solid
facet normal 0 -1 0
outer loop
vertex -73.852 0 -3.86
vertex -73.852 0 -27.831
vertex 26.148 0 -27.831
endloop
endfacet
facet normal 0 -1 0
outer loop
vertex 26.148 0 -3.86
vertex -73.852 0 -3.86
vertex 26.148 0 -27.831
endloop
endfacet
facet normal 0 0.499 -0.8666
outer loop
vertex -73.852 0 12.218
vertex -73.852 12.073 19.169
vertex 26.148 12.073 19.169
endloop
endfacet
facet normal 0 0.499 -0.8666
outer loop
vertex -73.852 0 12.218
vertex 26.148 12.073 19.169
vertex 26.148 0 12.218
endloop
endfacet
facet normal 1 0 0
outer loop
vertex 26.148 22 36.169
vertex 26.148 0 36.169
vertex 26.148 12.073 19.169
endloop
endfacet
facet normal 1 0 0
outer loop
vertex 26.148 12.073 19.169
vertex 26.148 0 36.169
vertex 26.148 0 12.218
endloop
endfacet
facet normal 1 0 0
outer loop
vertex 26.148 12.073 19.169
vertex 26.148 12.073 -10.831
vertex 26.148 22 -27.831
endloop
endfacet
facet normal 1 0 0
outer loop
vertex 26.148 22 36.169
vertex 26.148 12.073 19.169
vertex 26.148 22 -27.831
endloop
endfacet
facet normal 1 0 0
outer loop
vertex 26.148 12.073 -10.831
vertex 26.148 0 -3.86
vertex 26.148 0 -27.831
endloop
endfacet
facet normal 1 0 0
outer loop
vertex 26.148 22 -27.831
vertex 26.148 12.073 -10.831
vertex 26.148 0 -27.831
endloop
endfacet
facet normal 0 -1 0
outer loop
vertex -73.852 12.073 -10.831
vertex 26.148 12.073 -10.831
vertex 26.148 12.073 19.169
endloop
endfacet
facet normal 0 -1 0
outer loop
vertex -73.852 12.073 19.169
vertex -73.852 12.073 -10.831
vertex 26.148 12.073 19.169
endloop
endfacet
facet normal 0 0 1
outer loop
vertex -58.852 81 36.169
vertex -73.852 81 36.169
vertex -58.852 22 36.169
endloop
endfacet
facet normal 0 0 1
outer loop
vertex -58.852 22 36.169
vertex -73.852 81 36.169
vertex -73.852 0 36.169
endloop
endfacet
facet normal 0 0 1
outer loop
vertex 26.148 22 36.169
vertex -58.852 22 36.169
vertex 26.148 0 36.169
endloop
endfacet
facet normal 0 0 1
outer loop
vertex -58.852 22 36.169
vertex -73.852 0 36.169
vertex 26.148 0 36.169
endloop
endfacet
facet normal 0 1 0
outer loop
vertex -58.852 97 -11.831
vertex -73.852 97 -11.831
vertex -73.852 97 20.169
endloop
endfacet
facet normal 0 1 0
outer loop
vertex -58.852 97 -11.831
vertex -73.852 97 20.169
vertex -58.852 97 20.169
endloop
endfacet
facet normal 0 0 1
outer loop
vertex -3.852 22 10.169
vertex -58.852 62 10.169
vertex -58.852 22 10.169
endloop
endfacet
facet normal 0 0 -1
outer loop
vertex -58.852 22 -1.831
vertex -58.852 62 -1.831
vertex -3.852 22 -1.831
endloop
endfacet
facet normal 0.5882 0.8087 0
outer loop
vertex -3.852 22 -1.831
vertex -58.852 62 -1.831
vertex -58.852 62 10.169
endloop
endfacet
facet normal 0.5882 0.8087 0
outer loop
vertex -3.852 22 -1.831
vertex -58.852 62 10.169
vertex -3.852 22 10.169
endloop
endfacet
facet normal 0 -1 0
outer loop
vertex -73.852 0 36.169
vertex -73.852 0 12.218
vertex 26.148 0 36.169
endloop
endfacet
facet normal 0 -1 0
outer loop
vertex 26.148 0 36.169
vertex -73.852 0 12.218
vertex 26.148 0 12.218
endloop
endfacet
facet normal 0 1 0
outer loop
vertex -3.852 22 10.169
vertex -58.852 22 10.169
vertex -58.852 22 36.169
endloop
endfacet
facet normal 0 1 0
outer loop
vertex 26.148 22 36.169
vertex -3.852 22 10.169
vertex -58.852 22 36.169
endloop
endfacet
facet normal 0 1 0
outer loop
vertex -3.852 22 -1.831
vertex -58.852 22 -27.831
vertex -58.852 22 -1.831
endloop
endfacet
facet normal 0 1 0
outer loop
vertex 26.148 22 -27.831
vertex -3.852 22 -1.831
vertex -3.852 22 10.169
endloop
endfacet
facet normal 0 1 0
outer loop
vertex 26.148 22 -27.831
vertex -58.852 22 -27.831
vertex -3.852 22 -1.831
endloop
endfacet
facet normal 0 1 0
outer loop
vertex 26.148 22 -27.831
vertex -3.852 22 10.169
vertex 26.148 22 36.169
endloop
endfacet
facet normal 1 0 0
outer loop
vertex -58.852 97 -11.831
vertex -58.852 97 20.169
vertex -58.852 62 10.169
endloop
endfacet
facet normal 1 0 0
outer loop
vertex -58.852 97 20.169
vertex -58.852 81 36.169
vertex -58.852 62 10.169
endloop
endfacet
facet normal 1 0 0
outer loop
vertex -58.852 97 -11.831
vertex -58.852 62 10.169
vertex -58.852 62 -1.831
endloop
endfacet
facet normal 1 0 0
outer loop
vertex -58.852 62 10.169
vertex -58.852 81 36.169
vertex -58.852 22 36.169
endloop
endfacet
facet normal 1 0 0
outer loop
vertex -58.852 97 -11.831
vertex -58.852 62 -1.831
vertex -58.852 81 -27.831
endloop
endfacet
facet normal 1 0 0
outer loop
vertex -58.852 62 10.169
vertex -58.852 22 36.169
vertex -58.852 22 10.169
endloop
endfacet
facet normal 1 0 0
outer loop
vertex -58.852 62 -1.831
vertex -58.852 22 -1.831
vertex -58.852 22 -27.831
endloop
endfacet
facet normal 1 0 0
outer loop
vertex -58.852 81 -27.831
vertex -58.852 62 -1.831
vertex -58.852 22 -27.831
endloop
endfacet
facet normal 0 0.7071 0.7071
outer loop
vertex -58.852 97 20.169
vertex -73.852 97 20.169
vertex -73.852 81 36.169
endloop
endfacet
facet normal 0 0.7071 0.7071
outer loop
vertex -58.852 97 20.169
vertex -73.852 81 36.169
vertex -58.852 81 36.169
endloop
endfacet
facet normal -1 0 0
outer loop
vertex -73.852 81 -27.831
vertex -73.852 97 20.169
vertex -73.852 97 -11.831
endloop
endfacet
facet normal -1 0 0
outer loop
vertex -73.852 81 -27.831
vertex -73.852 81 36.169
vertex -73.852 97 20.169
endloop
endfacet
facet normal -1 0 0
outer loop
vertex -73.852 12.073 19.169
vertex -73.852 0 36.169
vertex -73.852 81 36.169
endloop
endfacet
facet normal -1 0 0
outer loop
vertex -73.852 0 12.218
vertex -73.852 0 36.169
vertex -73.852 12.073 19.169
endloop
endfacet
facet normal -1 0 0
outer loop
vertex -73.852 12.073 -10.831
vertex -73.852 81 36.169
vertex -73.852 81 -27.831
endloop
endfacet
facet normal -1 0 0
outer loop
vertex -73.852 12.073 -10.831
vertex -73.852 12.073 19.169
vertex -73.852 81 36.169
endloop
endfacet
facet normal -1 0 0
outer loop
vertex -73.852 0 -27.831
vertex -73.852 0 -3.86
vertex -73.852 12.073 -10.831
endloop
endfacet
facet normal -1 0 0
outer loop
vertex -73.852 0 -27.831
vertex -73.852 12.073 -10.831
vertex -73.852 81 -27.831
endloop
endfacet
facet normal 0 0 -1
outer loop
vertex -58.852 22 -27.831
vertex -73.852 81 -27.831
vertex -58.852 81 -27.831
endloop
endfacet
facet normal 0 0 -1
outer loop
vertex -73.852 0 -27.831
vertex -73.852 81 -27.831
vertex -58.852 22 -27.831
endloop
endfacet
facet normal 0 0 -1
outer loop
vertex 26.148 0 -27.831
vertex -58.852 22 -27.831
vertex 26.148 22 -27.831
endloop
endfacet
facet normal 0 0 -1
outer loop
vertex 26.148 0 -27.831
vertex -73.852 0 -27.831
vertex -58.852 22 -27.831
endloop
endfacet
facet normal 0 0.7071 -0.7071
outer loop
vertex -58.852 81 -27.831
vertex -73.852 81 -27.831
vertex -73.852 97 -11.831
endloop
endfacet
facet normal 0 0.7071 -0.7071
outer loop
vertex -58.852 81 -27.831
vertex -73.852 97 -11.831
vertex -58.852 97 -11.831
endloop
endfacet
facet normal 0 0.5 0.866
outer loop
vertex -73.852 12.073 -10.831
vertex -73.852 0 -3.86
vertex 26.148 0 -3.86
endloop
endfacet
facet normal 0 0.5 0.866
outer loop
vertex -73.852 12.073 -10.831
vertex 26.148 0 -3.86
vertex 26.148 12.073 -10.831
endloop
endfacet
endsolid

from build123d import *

# Parameters (mm, degrees)
SKETCH2_W           = 100
SKETCH2_H           = 64
BOSS_EXTRUDE1_DEPTH = 22
CUT_EXTRUDE1_DEPTH  = 126
SKETCH4_W           = 15
SKETCH4_H           = 64
BOSS_EXTRUDE2_DEPTH = 75
CHAMFER1_SIZE       = 16
CHAMFER2_SIZE       = 16
RIB2_REACH          = 128.044
SKETCH10_WALL_W     = 322.09589175
SKETCH10_WALL_H     = 12


with BuildPart() as part:
    # Sketch2 → Boss-Extrude1 (new body)
    with BuildSketch(Plane(origin=(0, 0, 0), x_dir=(1, 0, 0), z_dir=(0, 1, 0))):
        with Locations((-23.852270783, -4.169452289)):
            Rectangle(SKETCH2_W, SKETCH2_H)
    extrude(amount=BOSS_EXTRUDE1_DEPTH)

    # Sketch3 → Cut-Extrude1 (cut)
    with BuildSketch(Plane.ZY.offset(73.852270783)):
        Polygon((19.169452289, 12.073281473), (12.217656655, 0), (-3.860035403, 0), (-10.830547711, 12.073281473), align=None)
    extrude(amount=-CUT_EXTRUDE1_DEPTH, mode=Mode.SUBTRACT)

    # Sketch4 → Boss-Extrude2 (add)
    with BuildSketch(Plane(origin=(0, 22, 0), x_dir=(1, 0, 0), z_dir=(0, 1, 0))):
        with Locations((-66.352270783, -4.169452289)):
            Rectangle(SKETCH4_W, SKETCH4_H)
    extrude(amount=BOSS_EXTRUDE2_DEPTH)

    # Chamfer1
    chamfer1_edges = [part.edges().sort_by_distance(p)[0] for p in [
        (-66.352270783, 97, 36.169452289),
    ]]
    chamfer(chamfer1_edges, length=CHAMFER1_SIZE)

    # Chamfer2
    chamfer2_edges = [part.edges().sort_by_distance(p)[0] for p in [
        (-66.352270783, 97, -27.830547711),
    ]]
    chamfer(chamfer2_edges, length=CHAMFER2_SIZE)

    # Sketch10 wall → Rib2 (add, up to next)
    with BuildSketch(Plane(origin=(-31.352270783, 42, 4.169452289), x_dir=(0.808736084303, -0.588171697675, 0), z_dir=(0.588171697675, 0.808736084303, 0)), mode=Mode.PRIVATE) as rib2_sk1:
        Rectangle(SKETCH10_WALL_W, SKETCH10_WALL_H)
    rib2_tool1 = extrude(rib2_sk1.sketch, amount=-RIB2_REACH, mode=Mode.PRIVATE) - part.part
    add(rib2_tool1.solids().sort_by_distance((-31.352270783, 42, 4.169452289))[0])


solid = part.part
